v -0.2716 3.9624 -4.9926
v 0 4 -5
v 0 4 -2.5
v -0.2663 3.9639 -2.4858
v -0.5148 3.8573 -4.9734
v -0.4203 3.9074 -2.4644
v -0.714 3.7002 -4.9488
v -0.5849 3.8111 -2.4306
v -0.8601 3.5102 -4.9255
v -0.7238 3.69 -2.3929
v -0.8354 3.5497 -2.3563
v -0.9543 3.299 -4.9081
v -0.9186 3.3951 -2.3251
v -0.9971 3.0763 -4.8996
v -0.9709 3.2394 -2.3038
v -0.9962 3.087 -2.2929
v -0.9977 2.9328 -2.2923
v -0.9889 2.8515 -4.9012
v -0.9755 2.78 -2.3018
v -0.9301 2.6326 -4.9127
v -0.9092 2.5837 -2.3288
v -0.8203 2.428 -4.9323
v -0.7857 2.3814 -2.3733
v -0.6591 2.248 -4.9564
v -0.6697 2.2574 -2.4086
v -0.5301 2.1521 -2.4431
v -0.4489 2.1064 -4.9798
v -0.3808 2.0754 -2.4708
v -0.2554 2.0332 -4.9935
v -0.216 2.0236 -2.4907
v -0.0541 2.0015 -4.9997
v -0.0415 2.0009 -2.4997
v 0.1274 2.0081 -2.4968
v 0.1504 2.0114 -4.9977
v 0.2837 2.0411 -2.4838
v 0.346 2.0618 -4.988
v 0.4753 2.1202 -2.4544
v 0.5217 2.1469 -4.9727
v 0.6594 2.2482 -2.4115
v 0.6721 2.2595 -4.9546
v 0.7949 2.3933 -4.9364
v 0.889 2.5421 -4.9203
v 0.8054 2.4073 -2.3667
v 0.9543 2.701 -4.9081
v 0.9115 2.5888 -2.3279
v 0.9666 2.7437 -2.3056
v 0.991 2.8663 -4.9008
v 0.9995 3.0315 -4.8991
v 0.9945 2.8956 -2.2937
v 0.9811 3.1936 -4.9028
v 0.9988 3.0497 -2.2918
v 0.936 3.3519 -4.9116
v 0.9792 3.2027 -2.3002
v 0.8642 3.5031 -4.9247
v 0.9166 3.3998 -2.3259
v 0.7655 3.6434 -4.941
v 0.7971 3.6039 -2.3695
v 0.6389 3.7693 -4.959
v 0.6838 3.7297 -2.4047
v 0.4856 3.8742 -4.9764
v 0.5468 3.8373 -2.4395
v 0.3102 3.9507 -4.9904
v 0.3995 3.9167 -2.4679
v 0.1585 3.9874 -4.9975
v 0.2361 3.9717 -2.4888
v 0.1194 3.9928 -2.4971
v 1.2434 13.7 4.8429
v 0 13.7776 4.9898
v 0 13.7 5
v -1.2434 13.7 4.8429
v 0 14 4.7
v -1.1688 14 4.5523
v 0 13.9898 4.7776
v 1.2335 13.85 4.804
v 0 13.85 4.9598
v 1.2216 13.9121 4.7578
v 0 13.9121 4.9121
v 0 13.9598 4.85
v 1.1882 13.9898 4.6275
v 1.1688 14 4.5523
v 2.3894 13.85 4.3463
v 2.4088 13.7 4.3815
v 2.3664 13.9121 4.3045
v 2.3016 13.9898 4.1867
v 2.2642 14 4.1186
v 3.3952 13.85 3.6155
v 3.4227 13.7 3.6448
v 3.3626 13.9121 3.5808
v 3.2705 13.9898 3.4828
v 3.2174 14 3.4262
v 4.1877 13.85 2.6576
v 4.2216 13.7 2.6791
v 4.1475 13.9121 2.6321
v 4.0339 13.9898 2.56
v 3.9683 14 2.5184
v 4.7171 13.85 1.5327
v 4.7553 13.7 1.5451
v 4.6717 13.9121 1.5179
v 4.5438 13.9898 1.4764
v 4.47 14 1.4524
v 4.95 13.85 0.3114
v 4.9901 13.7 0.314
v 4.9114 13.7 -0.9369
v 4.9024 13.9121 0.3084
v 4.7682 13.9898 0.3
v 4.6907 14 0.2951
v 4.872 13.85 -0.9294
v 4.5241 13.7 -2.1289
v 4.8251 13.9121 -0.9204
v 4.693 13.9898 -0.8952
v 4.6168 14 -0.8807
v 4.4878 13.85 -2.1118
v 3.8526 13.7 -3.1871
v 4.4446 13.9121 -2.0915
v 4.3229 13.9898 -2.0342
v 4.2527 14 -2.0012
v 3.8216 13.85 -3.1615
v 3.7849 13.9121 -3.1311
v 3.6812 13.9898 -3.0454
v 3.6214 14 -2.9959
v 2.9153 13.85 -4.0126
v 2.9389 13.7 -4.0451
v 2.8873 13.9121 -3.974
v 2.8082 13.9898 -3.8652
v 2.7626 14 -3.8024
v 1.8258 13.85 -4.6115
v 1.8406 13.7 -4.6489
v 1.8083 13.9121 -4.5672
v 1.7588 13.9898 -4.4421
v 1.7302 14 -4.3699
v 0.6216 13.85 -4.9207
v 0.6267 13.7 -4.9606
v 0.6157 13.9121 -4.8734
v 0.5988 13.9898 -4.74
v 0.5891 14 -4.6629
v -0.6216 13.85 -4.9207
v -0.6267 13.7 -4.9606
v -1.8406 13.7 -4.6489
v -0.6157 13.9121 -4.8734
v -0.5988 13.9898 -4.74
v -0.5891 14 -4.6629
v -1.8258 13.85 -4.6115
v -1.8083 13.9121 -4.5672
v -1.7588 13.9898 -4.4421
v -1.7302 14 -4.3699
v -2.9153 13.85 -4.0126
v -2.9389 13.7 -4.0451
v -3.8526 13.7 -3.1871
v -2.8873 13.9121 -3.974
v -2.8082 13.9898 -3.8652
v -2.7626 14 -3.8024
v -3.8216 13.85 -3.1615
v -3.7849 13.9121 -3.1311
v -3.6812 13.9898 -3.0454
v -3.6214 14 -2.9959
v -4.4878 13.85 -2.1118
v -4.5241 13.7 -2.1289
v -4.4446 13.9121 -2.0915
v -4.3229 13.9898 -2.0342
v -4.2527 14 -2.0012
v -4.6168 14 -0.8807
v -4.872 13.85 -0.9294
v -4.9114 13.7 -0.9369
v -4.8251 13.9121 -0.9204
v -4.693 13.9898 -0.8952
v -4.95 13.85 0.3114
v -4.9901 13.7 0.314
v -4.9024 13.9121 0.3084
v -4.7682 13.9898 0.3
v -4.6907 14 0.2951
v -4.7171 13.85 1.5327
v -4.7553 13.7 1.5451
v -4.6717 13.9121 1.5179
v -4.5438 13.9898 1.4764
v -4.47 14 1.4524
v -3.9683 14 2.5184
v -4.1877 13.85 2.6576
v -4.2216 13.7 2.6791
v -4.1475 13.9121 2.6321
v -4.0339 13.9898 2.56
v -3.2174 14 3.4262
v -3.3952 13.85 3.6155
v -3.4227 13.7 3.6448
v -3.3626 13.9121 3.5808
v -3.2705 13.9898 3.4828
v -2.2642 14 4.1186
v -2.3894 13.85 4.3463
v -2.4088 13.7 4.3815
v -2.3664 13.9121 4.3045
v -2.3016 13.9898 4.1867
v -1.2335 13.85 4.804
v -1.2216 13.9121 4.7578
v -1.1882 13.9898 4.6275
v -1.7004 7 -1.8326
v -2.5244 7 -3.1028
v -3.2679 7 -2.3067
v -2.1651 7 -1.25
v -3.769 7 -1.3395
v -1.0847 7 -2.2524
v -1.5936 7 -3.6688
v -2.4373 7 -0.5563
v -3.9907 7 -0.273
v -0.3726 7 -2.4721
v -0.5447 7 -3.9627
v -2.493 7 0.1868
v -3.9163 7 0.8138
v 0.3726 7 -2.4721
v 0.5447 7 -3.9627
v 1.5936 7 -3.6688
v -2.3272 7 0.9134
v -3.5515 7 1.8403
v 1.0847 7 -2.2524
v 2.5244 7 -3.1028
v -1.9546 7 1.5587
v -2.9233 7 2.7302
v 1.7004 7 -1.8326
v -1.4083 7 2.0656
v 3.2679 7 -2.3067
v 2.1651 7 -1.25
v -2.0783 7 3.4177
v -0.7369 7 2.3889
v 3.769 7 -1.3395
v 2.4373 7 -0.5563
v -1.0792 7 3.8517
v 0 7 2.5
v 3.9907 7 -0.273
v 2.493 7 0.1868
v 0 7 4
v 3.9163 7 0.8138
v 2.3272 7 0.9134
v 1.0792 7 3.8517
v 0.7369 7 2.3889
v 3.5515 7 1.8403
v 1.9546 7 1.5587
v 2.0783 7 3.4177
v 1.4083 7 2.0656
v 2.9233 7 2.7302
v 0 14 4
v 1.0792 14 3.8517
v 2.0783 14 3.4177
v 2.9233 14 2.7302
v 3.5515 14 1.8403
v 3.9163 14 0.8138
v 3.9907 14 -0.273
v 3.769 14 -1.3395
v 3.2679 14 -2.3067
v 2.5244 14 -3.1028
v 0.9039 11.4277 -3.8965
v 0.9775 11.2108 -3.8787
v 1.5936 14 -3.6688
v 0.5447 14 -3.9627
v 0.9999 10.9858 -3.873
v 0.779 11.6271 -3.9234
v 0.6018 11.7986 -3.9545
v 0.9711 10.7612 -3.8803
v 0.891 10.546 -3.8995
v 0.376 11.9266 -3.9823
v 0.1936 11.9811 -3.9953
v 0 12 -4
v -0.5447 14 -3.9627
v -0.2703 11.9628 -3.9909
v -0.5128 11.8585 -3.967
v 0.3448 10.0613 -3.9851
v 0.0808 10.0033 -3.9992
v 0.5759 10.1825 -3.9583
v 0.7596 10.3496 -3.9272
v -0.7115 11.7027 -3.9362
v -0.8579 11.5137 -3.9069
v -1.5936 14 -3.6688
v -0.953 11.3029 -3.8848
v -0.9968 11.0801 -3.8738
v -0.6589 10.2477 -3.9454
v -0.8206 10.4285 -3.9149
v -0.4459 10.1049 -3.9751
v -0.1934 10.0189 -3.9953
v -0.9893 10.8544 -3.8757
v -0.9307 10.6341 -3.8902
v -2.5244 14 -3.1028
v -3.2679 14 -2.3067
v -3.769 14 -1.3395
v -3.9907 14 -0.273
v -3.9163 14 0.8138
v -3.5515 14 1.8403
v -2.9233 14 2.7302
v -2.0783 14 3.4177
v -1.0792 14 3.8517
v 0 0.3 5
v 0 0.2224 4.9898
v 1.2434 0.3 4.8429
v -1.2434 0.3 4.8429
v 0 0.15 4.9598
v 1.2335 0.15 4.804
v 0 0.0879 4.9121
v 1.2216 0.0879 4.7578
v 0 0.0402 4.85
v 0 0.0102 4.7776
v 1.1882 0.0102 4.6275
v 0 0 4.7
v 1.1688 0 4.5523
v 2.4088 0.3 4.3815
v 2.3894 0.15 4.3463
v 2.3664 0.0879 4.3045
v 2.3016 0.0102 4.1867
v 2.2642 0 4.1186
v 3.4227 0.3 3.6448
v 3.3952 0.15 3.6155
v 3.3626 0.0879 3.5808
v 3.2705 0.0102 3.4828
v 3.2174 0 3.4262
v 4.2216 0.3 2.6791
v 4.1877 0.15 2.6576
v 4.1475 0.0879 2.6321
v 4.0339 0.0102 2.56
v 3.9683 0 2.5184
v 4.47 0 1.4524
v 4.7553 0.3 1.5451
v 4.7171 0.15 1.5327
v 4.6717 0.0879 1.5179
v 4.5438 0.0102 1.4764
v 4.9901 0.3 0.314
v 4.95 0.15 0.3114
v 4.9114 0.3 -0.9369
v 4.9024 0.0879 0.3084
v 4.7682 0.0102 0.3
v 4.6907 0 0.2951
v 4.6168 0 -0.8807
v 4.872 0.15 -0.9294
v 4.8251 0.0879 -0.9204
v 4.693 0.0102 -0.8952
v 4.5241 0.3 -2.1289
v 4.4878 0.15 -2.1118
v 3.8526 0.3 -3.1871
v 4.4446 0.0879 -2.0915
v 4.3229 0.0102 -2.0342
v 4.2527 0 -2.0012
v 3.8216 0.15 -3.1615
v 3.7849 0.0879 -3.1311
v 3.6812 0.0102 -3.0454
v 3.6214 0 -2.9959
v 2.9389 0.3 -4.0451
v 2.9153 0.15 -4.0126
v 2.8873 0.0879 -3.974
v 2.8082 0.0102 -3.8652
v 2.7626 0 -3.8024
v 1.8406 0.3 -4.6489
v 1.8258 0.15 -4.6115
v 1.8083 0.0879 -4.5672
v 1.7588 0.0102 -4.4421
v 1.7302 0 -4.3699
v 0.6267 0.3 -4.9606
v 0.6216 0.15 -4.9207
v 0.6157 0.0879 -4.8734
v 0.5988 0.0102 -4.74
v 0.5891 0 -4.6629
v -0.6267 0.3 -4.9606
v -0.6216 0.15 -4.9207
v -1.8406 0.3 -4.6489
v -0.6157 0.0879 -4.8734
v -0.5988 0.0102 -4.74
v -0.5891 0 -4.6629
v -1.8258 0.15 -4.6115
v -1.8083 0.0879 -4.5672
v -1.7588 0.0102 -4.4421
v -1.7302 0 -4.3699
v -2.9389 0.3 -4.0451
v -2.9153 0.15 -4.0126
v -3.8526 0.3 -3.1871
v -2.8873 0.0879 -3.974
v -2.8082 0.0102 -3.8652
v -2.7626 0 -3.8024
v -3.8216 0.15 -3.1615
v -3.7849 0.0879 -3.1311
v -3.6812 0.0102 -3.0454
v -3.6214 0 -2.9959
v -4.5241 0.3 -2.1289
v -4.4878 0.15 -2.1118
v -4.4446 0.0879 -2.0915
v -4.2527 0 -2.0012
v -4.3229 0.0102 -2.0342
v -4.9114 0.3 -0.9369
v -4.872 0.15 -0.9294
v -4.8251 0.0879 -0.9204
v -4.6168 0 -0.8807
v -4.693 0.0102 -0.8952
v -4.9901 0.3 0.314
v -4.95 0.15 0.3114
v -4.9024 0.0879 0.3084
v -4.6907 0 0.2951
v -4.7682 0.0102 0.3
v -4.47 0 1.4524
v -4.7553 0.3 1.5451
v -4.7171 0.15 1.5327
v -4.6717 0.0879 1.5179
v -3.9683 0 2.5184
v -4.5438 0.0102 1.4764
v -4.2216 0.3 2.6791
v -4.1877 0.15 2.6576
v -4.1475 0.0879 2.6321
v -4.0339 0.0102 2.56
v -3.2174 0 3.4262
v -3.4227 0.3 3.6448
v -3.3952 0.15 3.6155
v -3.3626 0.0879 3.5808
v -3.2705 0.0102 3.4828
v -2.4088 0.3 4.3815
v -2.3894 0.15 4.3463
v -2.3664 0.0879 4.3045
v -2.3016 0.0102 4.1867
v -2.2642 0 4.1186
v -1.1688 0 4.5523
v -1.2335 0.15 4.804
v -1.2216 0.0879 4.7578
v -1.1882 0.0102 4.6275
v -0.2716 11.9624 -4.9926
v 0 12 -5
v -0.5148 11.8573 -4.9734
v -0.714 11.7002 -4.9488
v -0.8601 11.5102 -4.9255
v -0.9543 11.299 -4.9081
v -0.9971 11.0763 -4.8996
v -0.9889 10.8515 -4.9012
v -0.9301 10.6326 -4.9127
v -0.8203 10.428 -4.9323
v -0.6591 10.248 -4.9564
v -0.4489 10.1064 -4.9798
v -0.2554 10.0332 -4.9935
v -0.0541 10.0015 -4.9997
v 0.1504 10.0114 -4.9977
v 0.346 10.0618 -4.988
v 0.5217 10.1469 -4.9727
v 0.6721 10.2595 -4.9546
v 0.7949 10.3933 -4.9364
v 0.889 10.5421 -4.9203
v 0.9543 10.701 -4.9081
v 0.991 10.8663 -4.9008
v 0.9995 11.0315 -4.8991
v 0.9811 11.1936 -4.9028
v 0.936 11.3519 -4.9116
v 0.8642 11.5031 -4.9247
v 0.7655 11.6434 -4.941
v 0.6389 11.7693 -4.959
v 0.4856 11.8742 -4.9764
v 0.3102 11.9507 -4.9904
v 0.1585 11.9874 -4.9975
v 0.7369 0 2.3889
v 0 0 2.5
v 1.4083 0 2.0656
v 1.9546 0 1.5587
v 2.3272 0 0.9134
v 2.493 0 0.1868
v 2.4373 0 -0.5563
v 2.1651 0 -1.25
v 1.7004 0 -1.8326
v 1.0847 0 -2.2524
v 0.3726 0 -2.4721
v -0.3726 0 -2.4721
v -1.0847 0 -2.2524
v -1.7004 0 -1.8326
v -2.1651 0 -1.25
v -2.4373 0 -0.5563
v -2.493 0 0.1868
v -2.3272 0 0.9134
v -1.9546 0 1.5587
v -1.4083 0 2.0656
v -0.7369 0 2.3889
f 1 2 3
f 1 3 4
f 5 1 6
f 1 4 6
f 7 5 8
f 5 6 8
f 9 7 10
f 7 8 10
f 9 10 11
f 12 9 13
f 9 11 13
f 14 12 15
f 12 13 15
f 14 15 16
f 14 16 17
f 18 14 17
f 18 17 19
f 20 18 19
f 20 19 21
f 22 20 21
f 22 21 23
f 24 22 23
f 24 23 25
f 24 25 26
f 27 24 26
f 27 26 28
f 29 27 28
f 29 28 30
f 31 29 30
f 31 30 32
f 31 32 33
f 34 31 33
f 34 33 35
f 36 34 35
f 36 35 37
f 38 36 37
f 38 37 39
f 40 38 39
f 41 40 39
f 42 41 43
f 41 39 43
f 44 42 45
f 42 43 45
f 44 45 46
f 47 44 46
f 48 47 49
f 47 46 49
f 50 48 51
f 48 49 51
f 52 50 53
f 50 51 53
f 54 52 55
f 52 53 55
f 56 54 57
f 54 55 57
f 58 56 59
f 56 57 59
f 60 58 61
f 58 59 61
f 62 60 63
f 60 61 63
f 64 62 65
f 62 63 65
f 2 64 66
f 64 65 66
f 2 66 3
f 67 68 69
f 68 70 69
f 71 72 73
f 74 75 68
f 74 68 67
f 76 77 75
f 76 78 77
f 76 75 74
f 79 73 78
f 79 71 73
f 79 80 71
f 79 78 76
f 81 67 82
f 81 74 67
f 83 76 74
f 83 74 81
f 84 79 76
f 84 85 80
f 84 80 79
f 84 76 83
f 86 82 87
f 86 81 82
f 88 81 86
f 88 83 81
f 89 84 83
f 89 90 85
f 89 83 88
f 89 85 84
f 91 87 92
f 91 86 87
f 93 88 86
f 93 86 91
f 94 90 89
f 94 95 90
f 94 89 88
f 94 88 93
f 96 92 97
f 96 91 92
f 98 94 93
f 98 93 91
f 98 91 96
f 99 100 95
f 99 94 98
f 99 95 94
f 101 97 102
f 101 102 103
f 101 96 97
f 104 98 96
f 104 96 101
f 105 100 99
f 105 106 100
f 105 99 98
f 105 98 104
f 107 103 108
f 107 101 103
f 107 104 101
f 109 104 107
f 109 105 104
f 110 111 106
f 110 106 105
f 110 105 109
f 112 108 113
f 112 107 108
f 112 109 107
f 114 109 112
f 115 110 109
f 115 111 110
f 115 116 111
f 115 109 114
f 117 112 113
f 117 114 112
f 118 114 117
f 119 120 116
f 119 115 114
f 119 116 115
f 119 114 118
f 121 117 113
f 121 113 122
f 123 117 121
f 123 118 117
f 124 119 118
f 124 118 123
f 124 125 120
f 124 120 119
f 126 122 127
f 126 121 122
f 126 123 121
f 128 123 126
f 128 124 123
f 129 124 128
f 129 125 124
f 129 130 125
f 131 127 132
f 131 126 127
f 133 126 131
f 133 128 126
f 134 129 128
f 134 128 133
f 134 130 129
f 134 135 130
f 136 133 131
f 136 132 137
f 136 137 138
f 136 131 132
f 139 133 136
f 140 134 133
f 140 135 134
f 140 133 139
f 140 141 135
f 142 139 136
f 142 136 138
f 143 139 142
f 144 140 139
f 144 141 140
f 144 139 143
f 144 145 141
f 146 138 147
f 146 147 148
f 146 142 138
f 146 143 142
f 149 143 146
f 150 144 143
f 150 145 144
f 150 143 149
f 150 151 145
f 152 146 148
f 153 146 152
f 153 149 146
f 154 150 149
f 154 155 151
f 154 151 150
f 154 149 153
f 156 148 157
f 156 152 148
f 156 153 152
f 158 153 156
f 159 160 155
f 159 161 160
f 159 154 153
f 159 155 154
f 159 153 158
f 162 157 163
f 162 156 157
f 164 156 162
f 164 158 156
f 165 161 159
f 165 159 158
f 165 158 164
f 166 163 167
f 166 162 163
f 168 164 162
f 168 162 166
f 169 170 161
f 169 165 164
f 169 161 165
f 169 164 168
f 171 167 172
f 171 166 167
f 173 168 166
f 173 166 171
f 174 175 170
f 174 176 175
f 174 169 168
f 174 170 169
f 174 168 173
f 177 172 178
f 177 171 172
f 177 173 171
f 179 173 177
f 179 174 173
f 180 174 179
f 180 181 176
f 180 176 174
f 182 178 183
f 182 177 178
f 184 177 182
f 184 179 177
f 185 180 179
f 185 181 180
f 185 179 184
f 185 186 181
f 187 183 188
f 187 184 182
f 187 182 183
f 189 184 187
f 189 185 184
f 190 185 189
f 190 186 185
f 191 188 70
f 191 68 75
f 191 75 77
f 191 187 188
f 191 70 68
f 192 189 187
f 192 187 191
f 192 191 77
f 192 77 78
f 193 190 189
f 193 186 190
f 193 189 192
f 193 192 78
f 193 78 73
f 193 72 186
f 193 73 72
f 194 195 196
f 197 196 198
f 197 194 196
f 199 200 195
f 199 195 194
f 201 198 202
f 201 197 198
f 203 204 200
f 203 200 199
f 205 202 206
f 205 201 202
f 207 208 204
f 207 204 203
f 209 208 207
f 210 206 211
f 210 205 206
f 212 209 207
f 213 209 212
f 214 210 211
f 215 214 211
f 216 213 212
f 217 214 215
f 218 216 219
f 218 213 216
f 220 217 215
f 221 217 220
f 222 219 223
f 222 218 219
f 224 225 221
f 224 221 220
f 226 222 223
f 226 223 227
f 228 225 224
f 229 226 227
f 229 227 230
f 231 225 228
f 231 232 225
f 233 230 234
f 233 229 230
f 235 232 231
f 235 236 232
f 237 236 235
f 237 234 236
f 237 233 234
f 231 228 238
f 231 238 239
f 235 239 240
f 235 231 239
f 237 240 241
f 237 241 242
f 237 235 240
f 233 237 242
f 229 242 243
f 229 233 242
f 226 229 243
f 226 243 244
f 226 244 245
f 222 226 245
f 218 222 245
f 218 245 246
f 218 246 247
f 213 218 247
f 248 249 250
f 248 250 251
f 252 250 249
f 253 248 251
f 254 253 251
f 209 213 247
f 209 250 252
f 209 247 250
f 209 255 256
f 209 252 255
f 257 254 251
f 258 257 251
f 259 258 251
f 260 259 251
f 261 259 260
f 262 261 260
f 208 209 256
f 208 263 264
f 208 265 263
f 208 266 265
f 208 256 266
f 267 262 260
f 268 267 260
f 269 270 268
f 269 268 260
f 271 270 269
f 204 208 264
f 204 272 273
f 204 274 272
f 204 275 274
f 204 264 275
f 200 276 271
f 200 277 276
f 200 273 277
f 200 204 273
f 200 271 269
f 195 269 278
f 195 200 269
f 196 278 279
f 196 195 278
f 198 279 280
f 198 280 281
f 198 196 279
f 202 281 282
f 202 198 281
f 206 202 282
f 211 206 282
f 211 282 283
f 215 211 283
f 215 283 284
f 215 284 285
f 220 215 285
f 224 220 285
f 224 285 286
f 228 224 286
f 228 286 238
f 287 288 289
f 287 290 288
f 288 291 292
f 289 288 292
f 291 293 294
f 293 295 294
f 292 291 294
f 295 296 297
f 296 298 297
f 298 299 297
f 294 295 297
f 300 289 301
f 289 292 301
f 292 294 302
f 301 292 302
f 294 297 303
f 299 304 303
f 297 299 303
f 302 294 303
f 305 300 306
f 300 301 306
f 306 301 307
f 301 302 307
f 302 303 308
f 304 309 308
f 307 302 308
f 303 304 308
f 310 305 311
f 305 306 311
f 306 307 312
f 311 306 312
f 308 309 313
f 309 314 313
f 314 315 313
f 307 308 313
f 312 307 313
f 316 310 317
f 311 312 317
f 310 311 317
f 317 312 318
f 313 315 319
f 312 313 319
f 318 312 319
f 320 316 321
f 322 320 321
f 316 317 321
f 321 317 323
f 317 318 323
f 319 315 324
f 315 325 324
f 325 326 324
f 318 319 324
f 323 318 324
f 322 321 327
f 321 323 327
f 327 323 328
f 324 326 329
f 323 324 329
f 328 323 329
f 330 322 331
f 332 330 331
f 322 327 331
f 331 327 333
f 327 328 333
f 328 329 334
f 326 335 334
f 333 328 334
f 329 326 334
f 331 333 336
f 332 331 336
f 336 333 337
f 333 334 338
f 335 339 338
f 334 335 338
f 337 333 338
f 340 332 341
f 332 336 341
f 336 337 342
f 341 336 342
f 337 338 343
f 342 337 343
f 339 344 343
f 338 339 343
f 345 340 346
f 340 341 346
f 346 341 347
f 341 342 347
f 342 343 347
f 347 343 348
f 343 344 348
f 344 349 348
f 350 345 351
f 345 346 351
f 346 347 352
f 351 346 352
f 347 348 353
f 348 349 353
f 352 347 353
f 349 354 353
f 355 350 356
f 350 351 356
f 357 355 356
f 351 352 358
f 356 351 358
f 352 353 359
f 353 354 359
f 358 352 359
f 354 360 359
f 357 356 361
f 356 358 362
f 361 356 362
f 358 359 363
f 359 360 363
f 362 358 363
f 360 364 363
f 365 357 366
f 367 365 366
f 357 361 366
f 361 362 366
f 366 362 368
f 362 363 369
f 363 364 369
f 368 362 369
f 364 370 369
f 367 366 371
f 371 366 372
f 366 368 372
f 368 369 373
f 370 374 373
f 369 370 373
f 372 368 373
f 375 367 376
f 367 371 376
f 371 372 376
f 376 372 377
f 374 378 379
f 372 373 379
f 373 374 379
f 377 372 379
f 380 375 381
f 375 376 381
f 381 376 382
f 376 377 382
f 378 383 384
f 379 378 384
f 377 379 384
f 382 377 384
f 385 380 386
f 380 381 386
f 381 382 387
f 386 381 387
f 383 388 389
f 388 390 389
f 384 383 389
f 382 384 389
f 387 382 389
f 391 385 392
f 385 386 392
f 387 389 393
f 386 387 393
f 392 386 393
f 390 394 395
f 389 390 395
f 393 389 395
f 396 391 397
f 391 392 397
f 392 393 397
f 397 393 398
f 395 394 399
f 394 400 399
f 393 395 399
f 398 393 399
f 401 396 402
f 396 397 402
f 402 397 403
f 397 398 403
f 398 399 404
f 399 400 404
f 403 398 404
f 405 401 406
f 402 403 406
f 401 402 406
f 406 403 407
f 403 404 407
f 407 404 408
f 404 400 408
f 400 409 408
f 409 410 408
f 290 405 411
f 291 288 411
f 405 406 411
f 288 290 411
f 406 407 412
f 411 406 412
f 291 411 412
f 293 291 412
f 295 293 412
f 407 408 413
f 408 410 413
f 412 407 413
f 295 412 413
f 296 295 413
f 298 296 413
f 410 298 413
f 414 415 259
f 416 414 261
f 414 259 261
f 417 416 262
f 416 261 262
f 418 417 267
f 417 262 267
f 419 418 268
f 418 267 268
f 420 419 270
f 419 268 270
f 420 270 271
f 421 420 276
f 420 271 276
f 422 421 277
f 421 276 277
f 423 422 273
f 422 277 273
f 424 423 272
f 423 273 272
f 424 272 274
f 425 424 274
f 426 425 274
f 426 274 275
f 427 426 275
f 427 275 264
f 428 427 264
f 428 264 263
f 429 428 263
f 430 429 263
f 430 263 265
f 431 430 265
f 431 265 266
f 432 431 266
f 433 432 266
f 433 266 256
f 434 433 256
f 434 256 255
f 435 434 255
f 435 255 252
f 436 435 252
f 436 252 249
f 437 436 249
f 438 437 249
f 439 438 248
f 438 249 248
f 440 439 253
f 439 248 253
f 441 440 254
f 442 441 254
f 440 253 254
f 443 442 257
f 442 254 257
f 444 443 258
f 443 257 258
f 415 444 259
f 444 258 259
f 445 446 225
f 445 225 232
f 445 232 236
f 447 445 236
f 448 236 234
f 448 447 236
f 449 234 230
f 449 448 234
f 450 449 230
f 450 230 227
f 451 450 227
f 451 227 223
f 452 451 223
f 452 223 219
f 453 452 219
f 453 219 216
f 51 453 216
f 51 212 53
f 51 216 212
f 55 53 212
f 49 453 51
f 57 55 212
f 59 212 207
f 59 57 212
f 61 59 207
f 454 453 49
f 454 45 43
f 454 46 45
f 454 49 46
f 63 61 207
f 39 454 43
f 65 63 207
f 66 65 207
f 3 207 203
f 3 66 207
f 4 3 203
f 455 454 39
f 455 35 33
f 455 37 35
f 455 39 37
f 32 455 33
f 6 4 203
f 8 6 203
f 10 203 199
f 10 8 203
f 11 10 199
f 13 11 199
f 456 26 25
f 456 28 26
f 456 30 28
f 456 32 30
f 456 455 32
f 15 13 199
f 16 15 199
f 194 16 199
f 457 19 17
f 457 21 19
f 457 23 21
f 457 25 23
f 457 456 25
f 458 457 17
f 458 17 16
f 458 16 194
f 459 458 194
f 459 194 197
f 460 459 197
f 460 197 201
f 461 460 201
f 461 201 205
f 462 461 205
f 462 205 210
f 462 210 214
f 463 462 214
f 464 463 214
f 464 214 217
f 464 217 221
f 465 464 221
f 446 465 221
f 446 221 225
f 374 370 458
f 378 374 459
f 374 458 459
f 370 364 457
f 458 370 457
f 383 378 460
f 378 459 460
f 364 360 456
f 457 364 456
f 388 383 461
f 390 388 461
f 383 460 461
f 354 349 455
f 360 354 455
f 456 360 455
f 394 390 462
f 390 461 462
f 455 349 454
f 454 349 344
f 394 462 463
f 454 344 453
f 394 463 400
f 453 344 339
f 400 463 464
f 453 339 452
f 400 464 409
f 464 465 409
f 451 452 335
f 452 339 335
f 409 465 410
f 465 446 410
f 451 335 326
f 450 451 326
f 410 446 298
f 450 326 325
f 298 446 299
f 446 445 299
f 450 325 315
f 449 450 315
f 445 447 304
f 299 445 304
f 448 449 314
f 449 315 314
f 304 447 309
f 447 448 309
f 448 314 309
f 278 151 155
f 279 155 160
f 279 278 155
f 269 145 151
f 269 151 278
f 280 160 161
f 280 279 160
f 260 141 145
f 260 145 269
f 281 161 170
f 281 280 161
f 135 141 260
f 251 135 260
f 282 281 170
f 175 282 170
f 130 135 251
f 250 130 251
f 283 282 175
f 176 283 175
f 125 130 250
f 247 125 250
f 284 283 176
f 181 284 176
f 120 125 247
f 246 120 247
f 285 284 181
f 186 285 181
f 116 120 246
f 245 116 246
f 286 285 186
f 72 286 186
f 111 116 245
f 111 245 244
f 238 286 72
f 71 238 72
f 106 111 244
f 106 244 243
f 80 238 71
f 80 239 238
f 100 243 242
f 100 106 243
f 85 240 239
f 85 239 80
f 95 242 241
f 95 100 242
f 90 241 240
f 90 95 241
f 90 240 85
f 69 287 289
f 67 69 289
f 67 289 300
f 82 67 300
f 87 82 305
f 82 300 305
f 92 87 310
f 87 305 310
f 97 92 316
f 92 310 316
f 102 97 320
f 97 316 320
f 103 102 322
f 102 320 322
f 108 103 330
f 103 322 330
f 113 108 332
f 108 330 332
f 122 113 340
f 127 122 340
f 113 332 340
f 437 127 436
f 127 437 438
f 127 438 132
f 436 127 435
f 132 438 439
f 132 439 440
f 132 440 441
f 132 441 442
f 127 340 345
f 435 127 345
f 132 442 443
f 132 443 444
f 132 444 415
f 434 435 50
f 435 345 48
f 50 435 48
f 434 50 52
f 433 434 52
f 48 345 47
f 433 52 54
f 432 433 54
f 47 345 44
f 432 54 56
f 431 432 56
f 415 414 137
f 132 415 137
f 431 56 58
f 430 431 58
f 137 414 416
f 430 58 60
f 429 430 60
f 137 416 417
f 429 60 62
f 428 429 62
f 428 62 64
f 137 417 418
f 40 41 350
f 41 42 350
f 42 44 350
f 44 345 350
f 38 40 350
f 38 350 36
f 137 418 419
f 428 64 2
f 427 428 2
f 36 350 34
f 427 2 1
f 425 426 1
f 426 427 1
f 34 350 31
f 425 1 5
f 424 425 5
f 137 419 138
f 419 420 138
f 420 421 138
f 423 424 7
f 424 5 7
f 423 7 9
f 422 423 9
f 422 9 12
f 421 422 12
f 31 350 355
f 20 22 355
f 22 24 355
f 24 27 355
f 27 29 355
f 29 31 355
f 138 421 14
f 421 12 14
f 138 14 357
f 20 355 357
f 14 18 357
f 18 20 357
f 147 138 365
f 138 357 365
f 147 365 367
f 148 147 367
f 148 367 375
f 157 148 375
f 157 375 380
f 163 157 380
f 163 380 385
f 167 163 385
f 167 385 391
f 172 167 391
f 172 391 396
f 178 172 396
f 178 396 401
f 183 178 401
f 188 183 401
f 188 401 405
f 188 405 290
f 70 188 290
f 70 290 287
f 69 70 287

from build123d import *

# Parameters (mm, degrees)
SKETCH_1_R          = 5
SKETCH_1_R_2        = 2.5
EXTRUDE_1_DEPTH     = 7
SKETCH_2_R          = 5
SKETCH_2_R_2        = 4
EXTRUDE_2_DEPTH     = 7
FILLET_1_R          = 0.3
SKETCH_3_R          = 1
CUT_EXTRUDE_1_DEPTH = 7


with BuildPart() as part:
    # 草图1 → 凸台-拉伸1 (new body)
    with BuildSketch(Plane(origin=(0, 0, 0), x_dir=(1, 0, 0), z_dir=(0, 1, 0))):
        with Locations(Location((0, 0, 0), (0, 0, 270))):
            Circle(SKETCH_1_R)
        with Locations(Location((0, 0, 0), (0, 0, 270))):
            Circle(SKETCH_1_R_2, mode=Mode.SUBTRACT)
    extrude(amount=EXTRUDE_1_DEPTH)

    # 草图2 → 凸台-拉伸2 (add)
    with BuildSketch(Plane(origin=(0, 7, 0), x_dir=(1, 0, 0), z_dir=(0, 1, 0))):
        with Locations(Location((0, 0, 0), (0, 0, 270))):
            Circle(SKETCH_2_R)
        with Locations(Location((0, 0, 0), (0, 0, 270))):
            Circle(SKETCH_2_R_2, mode=Mode.SUBTRACT)
    extrude(amount=EXTRUDE_2_DEPTH)

    # 圆角1
    fillet_1_edges = [part.edges().sort_by_distance(p)[0] for p in [
        (0, 14, -5),
        (0, 0, -5),
    ]]
    fillet(fillet_1_edges, radius=FILLET_1_R)

    # 草图3 → 切除-拉伸1 (cut)
    with BuildSketch(Plane.XY):
        with Locations(Location((0, 11, 0), (0, 0, 90))):
            Circle(SKETCH_3_R)
        with Locations(Location((0, 3, 0), (0, 0, 90))):
            Circle(SKETCH_3_R)
    extrude(amount=-CUT_EXTRUDE_1_DEPTH, mode=Mode.SUBTRACT)


solid = part.part
